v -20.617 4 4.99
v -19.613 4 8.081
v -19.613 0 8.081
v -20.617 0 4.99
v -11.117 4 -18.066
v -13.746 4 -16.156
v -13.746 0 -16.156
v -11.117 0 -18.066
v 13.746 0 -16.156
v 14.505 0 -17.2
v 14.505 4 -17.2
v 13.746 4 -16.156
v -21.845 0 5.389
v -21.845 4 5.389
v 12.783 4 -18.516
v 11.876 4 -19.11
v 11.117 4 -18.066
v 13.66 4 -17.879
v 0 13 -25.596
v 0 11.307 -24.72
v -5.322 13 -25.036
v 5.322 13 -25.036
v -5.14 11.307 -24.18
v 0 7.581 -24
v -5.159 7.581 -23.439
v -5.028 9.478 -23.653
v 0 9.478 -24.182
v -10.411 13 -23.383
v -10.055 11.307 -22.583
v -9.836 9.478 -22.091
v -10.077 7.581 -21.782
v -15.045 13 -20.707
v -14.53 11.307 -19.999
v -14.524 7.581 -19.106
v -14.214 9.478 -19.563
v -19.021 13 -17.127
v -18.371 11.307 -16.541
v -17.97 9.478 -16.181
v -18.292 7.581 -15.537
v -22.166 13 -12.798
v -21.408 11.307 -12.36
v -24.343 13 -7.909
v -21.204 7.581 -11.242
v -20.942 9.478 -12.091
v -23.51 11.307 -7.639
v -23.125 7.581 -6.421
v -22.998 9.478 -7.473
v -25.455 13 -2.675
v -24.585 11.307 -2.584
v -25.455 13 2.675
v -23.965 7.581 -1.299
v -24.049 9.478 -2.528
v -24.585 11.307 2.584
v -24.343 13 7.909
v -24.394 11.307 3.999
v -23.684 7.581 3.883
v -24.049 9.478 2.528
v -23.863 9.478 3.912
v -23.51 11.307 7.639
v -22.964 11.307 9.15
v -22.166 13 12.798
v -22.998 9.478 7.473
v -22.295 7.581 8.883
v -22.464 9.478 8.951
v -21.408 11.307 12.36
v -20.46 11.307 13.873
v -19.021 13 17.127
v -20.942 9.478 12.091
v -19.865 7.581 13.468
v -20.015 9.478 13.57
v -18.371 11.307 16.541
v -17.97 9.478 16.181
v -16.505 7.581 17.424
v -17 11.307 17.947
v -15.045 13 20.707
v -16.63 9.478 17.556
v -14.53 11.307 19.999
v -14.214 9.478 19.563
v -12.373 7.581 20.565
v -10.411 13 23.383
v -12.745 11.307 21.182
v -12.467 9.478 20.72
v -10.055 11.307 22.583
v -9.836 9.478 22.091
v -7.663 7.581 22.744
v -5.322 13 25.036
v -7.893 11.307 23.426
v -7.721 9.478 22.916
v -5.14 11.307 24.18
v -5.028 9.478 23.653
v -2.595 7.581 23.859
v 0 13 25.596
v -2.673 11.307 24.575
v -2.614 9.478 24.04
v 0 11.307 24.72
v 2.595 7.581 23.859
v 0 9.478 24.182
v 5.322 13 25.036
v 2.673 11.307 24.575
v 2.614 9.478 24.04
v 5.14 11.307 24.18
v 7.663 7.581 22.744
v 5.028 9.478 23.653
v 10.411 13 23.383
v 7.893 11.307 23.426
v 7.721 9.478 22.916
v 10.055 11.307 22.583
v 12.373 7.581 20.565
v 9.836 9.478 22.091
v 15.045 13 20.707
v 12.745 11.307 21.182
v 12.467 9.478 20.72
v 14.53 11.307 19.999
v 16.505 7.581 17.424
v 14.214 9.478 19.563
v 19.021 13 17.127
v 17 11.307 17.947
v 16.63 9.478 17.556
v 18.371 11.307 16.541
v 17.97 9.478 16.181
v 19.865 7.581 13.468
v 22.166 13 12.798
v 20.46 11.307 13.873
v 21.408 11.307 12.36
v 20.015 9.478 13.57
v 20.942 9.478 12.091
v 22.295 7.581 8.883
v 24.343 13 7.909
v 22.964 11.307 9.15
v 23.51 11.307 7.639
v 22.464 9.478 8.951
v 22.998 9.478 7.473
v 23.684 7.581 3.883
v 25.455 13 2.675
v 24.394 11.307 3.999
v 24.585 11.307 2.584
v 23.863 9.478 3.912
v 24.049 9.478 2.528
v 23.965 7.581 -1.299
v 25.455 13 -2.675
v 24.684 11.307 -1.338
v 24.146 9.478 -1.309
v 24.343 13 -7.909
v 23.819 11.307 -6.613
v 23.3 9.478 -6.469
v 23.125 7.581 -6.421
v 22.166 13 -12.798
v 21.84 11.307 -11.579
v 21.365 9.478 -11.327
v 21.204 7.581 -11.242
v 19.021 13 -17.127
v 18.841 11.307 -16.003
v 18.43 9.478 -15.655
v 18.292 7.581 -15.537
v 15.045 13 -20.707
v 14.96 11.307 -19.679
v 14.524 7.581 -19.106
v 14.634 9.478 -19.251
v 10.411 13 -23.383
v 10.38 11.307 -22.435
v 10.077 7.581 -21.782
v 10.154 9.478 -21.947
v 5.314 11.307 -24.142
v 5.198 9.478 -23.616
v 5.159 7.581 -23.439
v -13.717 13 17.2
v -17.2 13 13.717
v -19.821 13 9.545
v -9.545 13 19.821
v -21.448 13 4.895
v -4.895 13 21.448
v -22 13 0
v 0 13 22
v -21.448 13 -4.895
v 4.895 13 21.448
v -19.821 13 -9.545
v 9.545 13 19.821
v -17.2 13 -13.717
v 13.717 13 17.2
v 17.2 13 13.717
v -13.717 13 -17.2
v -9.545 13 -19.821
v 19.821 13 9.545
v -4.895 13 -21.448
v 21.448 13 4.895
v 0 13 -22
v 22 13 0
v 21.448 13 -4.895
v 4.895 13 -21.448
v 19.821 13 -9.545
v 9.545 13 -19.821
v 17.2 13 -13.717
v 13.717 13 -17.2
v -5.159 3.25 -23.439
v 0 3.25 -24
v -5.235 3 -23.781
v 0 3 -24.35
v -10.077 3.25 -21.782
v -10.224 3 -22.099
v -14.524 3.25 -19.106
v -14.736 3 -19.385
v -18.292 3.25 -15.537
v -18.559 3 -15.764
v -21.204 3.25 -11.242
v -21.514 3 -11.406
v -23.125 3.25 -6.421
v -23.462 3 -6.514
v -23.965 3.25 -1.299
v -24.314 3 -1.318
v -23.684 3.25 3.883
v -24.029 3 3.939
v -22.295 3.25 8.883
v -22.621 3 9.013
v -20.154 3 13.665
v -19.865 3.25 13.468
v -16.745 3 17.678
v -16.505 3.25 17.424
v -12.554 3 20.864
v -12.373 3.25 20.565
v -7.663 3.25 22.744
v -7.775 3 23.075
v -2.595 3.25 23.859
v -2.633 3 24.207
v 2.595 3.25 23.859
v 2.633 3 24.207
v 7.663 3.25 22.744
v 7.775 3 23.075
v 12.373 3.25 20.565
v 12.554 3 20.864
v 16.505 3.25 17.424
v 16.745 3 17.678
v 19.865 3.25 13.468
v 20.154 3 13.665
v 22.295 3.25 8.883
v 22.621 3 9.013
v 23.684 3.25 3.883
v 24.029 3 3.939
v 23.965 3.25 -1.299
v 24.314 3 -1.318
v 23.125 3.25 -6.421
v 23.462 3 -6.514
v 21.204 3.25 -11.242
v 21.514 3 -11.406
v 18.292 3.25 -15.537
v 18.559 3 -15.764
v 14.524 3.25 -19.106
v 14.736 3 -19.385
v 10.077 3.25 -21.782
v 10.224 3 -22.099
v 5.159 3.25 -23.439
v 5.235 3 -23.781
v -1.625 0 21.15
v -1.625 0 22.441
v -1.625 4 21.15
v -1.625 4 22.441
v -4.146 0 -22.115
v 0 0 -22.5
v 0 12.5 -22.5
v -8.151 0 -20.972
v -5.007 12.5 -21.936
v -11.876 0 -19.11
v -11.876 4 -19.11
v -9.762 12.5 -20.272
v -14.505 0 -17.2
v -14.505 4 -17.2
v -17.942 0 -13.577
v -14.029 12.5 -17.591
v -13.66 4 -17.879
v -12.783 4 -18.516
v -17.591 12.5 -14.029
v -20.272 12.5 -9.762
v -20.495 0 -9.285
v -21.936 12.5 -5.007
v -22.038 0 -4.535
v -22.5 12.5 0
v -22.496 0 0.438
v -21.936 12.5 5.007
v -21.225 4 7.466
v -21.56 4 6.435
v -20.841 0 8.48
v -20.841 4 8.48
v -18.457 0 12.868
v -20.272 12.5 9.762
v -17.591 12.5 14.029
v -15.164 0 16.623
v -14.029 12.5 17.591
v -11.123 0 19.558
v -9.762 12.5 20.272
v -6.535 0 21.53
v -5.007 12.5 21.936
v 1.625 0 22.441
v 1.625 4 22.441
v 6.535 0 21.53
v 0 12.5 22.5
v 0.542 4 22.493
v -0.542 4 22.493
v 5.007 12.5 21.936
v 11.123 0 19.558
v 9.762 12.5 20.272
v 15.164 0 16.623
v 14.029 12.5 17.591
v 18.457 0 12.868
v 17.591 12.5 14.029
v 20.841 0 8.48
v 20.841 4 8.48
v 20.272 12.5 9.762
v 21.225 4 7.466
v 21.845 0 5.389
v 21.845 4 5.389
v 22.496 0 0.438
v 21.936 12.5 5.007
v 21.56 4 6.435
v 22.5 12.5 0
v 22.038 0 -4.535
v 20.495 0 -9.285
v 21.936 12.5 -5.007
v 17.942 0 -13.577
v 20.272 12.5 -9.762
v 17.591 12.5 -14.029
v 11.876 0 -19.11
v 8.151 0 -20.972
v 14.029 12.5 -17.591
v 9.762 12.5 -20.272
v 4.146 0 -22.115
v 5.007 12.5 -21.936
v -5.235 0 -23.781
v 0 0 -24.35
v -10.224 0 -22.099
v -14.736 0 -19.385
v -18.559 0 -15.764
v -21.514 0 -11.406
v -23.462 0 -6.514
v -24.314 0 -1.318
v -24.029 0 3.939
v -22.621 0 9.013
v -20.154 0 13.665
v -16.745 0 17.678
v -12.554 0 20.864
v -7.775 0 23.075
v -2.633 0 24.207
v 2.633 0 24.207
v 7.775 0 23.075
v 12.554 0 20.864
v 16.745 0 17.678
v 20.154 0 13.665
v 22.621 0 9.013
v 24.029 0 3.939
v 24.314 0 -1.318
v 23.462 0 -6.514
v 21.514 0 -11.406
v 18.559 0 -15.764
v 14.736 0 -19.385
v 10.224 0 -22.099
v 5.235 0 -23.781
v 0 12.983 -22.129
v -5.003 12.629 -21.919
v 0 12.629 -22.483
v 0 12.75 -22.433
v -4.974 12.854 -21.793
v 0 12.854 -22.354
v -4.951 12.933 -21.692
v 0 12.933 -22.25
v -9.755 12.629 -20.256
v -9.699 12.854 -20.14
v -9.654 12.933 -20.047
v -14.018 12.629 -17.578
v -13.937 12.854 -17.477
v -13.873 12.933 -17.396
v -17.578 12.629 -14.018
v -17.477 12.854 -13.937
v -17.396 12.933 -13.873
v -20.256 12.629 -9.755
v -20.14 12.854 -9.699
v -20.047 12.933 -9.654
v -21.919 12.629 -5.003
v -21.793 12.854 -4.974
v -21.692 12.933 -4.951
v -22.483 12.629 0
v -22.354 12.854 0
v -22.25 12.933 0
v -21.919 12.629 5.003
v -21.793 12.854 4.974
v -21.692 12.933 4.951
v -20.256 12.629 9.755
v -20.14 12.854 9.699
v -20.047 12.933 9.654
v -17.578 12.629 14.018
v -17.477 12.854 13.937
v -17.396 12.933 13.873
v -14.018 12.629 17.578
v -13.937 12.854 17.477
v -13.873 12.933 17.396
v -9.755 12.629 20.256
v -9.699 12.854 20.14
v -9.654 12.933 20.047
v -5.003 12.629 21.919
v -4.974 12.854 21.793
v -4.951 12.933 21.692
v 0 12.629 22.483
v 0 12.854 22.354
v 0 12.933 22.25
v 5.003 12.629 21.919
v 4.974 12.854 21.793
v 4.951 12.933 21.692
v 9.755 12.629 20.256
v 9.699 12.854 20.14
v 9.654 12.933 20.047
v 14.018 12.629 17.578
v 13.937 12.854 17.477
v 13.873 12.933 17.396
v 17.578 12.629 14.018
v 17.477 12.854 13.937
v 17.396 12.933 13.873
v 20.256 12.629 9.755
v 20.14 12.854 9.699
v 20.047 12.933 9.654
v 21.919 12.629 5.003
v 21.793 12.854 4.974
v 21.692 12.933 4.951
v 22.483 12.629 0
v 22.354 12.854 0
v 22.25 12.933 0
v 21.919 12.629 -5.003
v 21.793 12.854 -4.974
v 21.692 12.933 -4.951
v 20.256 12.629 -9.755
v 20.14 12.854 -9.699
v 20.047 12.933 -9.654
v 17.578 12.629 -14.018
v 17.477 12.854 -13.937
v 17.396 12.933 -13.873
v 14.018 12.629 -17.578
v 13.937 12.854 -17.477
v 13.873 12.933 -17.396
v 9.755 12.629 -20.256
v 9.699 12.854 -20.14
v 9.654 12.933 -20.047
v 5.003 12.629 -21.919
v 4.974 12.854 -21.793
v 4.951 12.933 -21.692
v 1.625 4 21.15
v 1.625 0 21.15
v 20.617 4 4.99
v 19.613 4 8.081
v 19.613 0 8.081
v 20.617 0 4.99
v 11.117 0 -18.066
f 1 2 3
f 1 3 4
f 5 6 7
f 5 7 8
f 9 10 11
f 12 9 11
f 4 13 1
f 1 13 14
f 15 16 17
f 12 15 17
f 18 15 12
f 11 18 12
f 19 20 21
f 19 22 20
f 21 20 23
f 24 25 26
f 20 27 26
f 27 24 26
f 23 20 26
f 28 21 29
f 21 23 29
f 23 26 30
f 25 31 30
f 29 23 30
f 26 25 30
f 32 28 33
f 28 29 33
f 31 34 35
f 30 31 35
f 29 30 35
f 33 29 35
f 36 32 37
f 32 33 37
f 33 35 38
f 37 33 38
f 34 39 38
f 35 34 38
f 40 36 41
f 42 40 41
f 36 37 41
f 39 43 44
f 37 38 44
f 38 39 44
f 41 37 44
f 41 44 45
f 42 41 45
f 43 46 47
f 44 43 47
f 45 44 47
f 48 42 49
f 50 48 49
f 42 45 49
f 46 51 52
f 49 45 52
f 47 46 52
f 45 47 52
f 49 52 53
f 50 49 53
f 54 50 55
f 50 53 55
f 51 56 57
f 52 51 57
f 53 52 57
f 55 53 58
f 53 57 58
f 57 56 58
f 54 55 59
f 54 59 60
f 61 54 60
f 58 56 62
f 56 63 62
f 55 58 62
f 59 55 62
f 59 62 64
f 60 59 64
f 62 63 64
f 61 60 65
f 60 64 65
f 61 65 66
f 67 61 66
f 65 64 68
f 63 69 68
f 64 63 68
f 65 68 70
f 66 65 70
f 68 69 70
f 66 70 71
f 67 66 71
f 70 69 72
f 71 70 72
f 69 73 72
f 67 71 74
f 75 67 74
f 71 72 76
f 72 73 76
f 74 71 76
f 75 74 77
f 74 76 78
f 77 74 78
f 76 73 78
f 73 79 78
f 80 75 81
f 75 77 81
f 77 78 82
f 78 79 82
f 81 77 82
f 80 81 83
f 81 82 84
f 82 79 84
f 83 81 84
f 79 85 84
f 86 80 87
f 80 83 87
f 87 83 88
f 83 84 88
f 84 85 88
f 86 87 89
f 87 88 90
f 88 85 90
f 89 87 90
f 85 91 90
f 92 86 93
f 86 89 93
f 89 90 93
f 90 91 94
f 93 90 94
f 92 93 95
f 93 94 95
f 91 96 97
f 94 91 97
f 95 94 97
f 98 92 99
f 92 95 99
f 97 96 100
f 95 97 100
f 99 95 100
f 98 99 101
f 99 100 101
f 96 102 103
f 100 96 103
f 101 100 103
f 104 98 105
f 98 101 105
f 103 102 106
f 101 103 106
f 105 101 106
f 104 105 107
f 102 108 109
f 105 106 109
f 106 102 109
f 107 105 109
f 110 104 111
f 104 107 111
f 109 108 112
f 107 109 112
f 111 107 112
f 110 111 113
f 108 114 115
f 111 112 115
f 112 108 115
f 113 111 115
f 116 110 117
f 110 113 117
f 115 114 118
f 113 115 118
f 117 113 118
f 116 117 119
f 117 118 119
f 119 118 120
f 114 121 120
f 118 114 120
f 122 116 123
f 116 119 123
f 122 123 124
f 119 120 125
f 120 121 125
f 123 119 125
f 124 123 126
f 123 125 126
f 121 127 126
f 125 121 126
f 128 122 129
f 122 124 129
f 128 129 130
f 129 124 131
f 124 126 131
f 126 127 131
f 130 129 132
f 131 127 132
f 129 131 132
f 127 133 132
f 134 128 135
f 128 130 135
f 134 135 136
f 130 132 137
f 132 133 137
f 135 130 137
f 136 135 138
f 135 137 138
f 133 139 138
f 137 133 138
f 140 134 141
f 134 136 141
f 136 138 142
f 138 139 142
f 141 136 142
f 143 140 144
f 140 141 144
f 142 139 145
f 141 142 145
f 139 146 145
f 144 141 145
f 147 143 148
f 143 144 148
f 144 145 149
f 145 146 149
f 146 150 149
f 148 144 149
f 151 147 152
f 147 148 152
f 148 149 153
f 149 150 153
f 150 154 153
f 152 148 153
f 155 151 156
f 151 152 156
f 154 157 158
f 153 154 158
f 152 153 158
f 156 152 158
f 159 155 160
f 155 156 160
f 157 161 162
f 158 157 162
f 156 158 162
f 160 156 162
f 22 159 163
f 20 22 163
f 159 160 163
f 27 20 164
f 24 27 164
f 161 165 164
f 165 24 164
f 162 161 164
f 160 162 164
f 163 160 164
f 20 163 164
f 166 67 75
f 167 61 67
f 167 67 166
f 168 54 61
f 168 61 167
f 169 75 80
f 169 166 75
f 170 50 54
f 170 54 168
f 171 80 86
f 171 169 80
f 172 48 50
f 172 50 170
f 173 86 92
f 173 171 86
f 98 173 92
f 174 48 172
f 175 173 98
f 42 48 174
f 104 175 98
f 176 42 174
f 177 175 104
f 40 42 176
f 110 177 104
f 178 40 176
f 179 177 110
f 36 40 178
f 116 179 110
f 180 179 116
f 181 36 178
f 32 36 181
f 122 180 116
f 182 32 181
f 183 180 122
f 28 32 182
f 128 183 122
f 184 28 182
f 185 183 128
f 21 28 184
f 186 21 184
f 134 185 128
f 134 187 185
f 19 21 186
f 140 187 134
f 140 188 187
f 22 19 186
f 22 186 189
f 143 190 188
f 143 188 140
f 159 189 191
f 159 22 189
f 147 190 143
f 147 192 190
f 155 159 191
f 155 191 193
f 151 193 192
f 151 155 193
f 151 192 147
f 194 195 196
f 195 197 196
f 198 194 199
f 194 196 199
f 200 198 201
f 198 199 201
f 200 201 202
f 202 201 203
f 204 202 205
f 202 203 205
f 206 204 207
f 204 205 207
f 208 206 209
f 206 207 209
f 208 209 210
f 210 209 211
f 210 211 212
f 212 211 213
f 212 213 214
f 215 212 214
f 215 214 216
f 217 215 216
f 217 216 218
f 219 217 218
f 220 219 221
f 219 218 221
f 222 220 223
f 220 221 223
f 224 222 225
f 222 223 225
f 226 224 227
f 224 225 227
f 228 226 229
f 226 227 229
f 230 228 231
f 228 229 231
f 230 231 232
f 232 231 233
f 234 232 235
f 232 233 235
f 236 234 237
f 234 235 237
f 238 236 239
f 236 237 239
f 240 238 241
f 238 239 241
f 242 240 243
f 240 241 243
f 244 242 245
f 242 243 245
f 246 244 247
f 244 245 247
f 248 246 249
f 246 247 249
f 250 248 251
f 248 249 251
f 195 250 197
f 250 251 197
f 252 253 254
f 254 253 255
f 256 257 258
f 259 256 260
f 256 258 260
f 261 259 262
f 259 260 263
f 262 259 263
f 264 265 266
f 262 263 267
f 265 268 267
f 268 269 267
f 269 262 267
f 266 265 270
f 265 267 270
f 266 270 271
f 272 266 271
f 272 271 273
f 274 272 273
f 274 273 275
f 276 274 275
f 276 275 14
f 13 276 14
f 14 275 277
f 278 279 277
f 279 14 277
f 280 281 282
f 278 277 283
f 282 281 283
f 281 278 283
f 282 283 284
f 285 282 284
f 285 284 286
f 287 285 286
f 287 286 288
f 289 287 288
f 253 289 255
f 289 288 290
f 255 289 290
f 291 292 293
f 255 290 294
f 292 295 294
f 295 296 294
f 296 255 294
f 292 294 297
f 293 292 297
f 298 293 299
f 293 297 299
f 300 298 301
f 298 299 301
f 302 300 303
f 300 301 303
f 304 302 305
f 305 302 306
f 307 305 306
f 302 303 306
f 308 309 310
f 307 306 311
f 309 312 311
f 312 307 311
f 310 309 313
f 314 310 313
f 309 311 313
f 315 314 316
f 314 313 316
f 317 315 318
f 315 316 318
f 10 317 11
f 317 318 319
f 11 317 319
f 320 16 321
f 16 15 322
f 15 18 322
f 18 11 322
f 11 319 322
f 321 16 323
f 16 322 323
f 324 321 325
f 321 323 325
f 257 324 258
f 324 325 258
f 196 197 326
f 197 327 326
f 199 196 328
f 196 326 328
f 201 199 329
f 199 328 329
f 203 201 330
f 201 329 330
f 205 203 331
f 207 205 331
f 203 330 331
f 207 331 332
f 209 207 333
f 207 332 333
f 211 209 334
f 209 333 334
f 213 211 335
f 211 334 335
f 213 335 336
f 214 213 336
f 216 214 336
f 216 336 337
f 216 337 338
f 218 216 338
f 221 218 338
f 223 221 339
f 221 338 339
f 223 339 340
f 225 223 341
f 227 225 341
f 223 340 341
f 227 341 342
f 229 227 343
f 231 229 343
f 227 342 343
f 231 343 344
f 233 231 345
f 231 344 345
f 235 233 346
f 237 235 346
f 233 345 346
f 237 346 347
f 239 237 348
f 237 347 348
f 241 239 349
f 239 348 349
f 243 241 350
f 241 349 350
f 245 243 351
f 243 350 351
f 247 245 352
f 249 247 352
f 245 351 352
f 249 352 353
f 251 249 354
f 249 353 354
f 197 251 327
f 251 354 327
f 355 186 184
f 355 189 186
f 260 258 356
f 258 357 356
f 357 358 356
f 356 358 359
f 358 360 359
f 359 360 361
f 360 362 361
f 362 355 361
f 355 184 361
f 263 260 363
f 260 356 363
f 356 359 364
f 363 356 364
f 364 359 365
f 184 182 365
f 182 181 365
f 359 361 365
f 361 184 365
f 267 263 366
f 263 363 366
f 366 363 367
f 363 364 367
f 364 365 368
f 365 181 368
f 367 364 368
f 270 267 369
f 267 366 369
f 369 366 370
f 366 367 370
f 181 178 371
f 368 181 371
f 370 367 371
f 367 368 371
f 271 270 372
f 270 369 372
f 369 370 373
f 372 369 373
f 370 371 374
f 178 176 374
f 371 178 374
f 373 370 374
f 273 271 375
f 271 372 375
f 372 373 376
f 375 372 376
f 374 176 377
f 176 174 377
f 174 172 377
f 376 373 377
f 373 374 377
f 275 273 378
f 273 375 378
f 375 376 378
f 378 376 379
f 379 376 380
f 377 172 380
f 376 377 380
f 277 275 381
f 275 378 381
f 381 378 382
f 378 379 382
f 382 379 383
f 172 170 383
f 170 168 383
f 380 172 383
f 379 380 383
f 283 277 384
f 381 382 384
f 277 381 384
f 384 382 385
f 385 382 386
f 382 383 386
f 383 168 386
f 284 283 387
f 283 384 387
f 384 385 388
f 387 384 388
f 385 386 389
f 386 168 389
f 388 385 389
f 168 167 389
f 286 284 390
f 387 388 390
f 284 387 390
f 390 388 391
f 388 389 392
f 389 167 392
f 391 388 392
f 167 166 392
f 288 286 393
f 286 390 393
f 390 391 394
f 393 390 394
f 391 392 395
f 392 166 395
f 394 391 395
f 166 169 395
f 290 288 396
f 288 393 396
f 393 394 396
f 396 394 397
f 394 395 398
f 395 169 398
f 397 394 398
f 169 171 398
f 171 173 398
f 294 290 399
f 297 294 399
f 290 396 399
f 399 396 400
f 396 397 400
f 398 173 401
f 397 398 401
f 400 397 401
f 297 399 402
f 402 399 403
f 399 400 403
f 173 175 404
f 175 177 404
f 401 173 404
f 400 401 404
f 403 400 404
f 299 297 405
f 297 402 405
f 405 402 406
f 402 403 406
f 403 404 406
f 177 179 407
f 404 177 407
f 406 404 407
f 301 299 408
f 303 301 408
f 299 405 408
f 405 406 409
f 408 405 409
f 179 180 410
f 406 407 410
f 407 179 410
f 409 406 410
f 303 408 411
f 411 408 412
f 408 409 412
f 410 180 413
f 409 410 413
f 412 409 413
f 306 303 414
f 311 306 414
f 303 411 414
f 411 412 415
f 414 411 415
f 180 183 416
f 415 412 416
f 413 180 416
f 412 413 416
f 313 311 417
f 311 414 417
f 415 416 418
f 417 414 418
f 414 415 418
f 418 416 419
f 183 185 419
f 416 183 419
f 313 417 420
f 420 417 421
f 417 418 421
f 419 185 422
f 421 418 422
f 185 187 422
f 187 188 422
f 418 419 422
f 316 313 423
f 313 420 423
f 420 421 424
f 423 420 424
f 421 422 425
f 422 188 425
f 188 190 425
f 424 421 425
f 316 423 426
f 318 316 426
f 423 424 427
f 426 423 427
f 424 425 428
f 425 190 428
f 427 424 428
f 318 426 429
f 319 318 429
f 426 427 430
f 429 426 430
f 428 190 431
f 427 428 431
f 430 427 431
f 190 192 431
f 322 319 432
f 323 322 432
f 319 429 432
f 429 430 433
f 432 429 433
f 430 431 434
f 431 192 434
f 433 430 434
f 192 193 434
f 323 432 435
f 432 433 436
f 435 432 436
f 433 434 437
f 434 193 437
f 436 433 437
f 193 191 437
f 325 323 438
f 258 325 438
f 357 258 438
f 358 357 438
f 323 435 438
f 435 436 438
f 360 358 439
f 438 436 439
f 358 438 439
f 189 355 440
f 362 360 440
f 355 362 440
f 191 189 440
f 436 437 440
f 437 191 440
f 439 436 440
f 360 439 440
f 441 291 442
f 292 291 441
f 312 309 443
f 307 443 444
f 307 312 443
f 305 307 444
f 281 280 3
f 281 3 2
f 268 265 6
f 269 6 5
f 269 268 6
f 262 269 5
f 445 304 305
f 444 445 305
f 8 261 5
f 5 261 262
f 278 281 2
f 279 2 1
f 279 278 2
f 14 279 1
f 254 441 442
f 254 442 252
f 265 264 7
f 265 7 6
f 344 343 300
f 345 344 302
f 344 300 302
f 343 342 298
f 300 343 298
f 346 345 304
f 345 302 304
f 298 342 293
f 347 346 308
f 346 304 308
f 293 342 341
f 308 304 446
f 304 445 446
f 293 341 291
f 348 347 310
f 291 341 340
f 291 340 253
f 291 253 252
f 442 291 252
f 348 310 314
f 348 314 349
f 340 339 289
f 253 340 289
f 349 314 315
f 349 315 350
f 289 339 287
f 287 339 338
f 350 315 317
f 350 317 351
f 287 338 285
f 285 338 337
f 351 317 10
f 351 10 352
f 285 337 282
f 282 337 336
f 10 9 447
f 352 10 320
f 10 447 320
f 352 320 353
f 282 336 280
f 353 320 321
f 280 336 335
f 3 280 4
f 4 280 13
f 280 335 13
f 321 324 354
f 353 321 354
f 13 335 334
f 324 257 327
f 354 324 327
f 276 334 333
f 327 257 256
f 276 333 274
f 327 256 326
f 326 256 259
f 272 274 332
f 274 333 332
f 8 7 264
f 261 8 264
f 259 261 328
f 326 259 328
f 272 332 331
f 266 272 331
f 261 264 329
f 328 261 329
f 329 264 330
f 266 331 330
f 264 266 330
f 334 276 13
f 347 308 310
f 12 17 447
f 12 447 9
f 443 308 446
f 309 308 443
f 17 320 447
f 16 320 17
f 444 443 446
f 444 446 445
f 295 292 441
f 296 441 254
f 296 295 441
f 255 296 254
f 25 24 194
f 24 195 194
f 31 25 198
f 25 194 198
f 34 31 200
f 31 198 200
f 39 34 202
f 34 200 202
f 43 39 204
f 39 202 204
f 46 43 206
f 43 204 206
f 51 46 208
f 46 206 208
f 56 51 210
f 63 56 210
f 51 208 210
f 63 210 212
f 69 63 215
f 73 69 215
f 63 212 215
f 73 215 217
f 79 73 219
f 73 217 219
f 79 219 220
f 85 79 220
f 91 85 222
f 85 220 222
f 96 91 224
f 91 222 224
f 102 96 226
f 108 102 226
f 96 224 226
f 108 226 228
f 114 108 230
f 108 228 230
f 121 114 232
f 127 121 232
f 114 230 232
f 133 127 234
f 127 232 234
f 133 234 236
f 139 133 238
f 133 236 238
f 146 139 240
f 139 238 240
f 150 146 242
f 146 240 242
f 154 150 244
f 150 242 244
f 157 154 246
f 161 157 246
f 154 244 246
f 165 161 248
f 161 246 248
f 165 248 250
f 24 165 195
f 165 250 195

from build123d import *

# Parameters (mm, degrees)
CUT_EXTRUDE3_DEPTH           = 60
CUT_EXTRUDE5_DEPTH           = 2
CUT_EXTRUDE5_DEPTH_BACK      = 30
SKETCH9_R                    = 38
SKETCH9_R_2                  = 23
SKETCH19_W                   = 12
SKETCH19_H                   = 36.5
CUT_REVOLVE2_ANGLE           = 65
CUT_REVOLVE2_OTHER_WAY_ANGLE = 65
SKETCH21_W                   = 3.25
SKETCH21_H                   = 4
BOSS_EXTRUDE3_DEPTH          = 1.35
CIRPATTERN1_COUNT            = 5
CUT_EXTRUDE9_START           = -5
CUT_EXTRUDE9_DEPTH           = 5
SKETCH23_R                   = 10.5
CUT_EXTRUDE10_DEPTH          = 10
SKETCH24_W                   = 15
SKETCH24_H                   = 8
BOSS_EXTRUDE4_DEPTH          = 8
SKETCH26_W                   = 10
SKETCH26_H                   = 6
CUT_EXTRUDE11_DEPTH          = 10
SKETCH27_W                   = 4
SKETCH27_H                   = 5
CUT_EXTRUDE12_DEPTH          = 5
CUT_EXTRUDE14_DEPTH          = 2
CUT_EXTRUDE14_DEPTH_BACK     = 30
SKETCH29_R                   = 1
CUT_EXTRUDE15_DEPTH          = 15
FILLET1_R                    = 6
FILLET2_R                    = 8
INTERSECT2_START             = 13
INTERSECT2_DEPTH             = 50.427876097


# Read off the part's stored shape, not the designer's step: Cut-Extrude9, Intersect2
with BuildPart() as part:
    # Sketch1 → Revolve1 (revolve)
    with BuildSketch(Plane.XY, mode=Mode.PRIVATE) as revolve1_sk:
        with BuildLine():
            Line((0, 63.427876097), (32, 63.427876097))
            ThreePointArc((32, 63.427876097), (37.656854249, 61.084730346), (40, 55.427876097))
            Line((40, 55.427876097), (40, 28.846818009))
            ThreePointArc((40, 28.846818009), (38.792081772, 24.082439968), (35.460140376, 20.469057744))
            Line((35.460140376, 20.469057744), (28.539859624, 15.958818353))
            ThreePointArc((28.539859624, 15.958818353), (25.207918228, 12.345436129), (24, 7.581058088))
            Line((24, 7.581058088), (24, 3.25))
            Line((24, 3.25), (24.35, 3))
            Line((24.35, 3), (24.35, 0))
            Line((24.35, 0), (22.5, 0))
            Line((22.5, 0), (22.5, 12.5))
            ThreePointArc((22.5, 12.5), (22.353553391, 12.853553391), (22, 13))
            Line((22, 13), (0, 13))
            Line((0, 13), (0, 63.427876097))
        make_face()
    revolve(revolve1_sk.sketch.rotate(Axis((0, 0, 0), (0, 1, 0)), 90), axis=Axis((0, 0, 0), (0, 1, 0)))

    # Sketch11 → Cut-Extrude3 (cut)
    with BuildSketch(Plane(origin=(0, 13, 0), x_dir=(-1, 0, 0), z_dir=(0, -1, 0))):
        with BuildLine():
            Line((-21, 0), (21, 0))
            ThreePointArc((21, 0), (0, 21), (-21, 0))
        make_face()
    extrude(amount=-CUT_EXTRUDE3_DEPTH, mode=Mode.SUBTRACT)

    # Sketch9 → Cut-Extrude5 (cut, two sides: drawn at the far end of the back side and taken through both)
    with BuildSketch(Plane(origin=(0, 55.427876097, 0), x_dir=(1, 0, 0), z_dir=(0, 1, 0)).offset(-CUT_EXTRUDE5_DEPTH_BACK)):
        with Locations(Location((0, 0, 0), (0, 0, 270))):
            Circle(SKETCH9_R)
        with Locations(Location((0, 0, 0), (0, 0, 270))):
            Circle(SKETCH9_R_2, mode=Mode.SUBTRACT)
    extrude(amount=CUT_EXTRUDE5_DEPTH + CUT_EXTRUDE5_DEPTH_BACK, mode=Mode.SUBTRACT)

    # Sketch19 → Cut-Revolve2 (revolve, cut)
    with BuildSketch(Plane(origin=(0, 0, 0), x_dir=(0, 0, -1), z_dir=(1, 0, 0))):
        with Locations((-41.064715832, 37.177876097)):
            Rectangle(SKETCH19_W, SKETCH19_H)
    revolve(axis=Axis((0, 0, 0), (0, 1, 0)), revolution_arc=CUT_REVOLVE2_ANGLE, mode=Mode.SUBTRACT)

    # Sketch19 → Cut-Revolve2 other way (revolve, cut)
    with BuildSketch(Plane(origin=(0, 0, 0), x_dir=(0, 0, -1), z_dir=(1, 0, 0))):
        with Locations((-41.064715832, 37.177876097)):
            Rectangle(SKETCH19_W, SKETCH19_H)
    revolve(axis=Axis((0, 0, 0), (0, -1, 0)), revolution_arc=CUT_REVOLVE2_OTHER_WAY_ANGLE, mode=Mode.SUBTRACT)

    # Sketch21 → Boss-Extrude3 (add)
    with BuildSketch(Plane(origin=(0, 0, 22.5), x_dir=(-1, 0, 0), z_dir=(0, 0, -1))):
        with Locations((0, 2)):
            Rectangle(SKETCH21_W, SKETCH21_H)
    boss_extrude3 = extrude(amount=BOSS_EXTRUDE3_DEPTH)

    # CirPattern1: Boss-Extrude3 ×5 about axis
    cirpattern1_axis = Axis((0, 0, 0), (0, 1, 0))
    for i in range(1, CIRPATTERN1_COUNT):
        add(boss_extrude3.rotate(cirpattern1_axis, i * 360 / CIRPATTERN1_COUNT))

    # Cut-Extrude9 outline → Cut-Extrude9 (cut)
    with BuildSketch(Plane(origin=(0, 63.427876097, 0), x_dir=(1, 0, 0), z_dir=(0, 1, 0)).offset(CUT_EXTRUDE9_START)):
        with BuildLine():
            ThreePointArc((40, 0), (0, 40), (-40, 0))
            Line((-40, 0), (-21, 0))
            ThreePointArc((-21, 0), (0, 21), (21, 0))
            Line((21, 0), (40, 0))
        make_face()
    extrude(amount=CUT_EXTRUDE9_DEPTH, mode=Mode.SUBTRACT)

    # Sketch23 → Cut-Extrude10 (cut)
    with BuildSketch(Plane(origin=(0, 0, -40), x_dir=(-1, 0, 0), z_dir=(0, 0, -1))):
        with Locations((0, 42.137876097)):
            Circle(SKETCH23_R)
    extrude(amount=-CUT_EXTRUDE10_DEPTH, mode=Mode.SUBTRACT)

    # Sketch24 → Boss-Extrude4 (add)
    with BuildSketch(Plane(origin=(0, 58.427876097, 0), x_dir=(1, 0, 0), z_dir=(0, 1, 0))):
        with Locations((0, 30)):
            Rectangle(SKETCH24_W, SKETCH24_H)
    extrude(amount=-BOSS_EXTRUDE4_DEPTH)

    # Sketch26 → Cut-Extrude11 (cut)
    with BuildSketch(Plane(origin=(0, 58.427876097, 0), x_dir=(1, 0, 0), z_dir=(0, 1, 0))):
        with Locations((0, 30)):
            Rectangle(SKETCH26_W, SKETCH26_H)
    extrude(amount=-CUT_EXTRUDE11_DEPTH, mode=Mode.SUBTRACT)

    # Sketch27 → Cut-Extrude12 (cut)
    with BuildSketch(Plane(origin=(7.5, 0, 0), x_dir=(0, 0, -1), z_dir=(1, 0, 0))):
        with Locations((30, 53.927876097)):
            Rectangle(SKETCH27_W, SKETCH27_H)
    extrude(amount=-CUT_EXTRUDE12_DEPTH, mode=Mode.SUBTRACT)

    # Sketch28 → Cut-Extrude14 (cut, two sides: drawn at the far end of the back side and taken through both)
    with BuildSketch(Plane(origin=(0, 55.427876097, 0), x_dir=(1, 0, 0), z_dir=(0, 1, 0)).offset(-CUT_EXTRUDE14_DEPTH_BACK)):
        with BuildLine():
            Line((-22.912878475, -2), (22.912878475, -2))
            ThreePointArc((22.912878475, -2), (0, -23), (-22.912878475, -2))
        make_face()
    extrude(amount=CUT_EXTRUDE14_DEPTH + CUT_EXTRUDE14_DEPTH_BACK, mode=Mode.SUBTRACT)

    # Sketch29 → Cut-Extrude15 (cut)
    with BuildSketch(Plane(origin=(0, 0, 0), x_dir=(-1, 0, 0), z_dir=(0, 0, -1))):
        with Locations((-30.416198487, 60.927876097)):
            Circle(SKETCH29_R)
        with Locations((30.416198487, 60.927876097)):
            Circle(SKETCH29_R)
        with Locations((0, 60.927876097)):
            Circle(SKETCH29_R)
    extrude(amount=-CUT_EXTRUDE15_DEPTH, mode=Mode.SUBTRACT)

    # Fillet1
    fillet1_edges = [part.edges().sort_by_distance(p)[0] for p in [
        (21, 35.713938048, 0),
        (-21, 35.713938048, 0),
    ]]
    fillet(fillet1_edges, radius=FILLET1_R)

    # Fillet2
    fillet2_edges = [part.edges().sort_by_distance(p)[0] for p in [
        (-22.912878475, 41.427876097, 2),
        (22.912878475, 41.427876097, 2),
    ]]
    fillet(fillet2_edges, radius=FILLET2_R)

    # Intersect2 outline → Intersect2 (cut)
    with BuildSketch(Plane(origin=(0, 0, 0), x_dir=(1, 0, 0), z_dir=(0, 1, 0)).offset(INTERSECT2_START)):
        with BuildLine():
            Line((-37.080992435, -15), (-42, -15))
            Line((-42, -15), (-42, -42))
            Line((-42, -42), (42, -42))
            Line((42, -42), (42, -15))
            Line((42, -15), (37.080992435, -15))
            ThreePointArc((37.080992435, -15), (0, 40), (-37.080992435, -15))
        make_face()
        with BuildLine():
            ThreePointArc((-13.747727085, 0), (-18.767687244, 2.713664655), (-19.246817919, 8.4))
            ThreePointArc((-19.246817919, 8.4), (0, 21), (19.246817919, 8.4))
            ThreePointArc((19.246817919, 8.4), (18.767687244, 2.713664655), (13.747727085, 0))
            Line((13.747727085, 0), (-13.747727085, 0))
        make_face(mode=Mode.SUBTRACT)
    extrude(amount=INTERSECT2_DEPTH, mode=Mode.SUBTRACT)


solid = part.part
